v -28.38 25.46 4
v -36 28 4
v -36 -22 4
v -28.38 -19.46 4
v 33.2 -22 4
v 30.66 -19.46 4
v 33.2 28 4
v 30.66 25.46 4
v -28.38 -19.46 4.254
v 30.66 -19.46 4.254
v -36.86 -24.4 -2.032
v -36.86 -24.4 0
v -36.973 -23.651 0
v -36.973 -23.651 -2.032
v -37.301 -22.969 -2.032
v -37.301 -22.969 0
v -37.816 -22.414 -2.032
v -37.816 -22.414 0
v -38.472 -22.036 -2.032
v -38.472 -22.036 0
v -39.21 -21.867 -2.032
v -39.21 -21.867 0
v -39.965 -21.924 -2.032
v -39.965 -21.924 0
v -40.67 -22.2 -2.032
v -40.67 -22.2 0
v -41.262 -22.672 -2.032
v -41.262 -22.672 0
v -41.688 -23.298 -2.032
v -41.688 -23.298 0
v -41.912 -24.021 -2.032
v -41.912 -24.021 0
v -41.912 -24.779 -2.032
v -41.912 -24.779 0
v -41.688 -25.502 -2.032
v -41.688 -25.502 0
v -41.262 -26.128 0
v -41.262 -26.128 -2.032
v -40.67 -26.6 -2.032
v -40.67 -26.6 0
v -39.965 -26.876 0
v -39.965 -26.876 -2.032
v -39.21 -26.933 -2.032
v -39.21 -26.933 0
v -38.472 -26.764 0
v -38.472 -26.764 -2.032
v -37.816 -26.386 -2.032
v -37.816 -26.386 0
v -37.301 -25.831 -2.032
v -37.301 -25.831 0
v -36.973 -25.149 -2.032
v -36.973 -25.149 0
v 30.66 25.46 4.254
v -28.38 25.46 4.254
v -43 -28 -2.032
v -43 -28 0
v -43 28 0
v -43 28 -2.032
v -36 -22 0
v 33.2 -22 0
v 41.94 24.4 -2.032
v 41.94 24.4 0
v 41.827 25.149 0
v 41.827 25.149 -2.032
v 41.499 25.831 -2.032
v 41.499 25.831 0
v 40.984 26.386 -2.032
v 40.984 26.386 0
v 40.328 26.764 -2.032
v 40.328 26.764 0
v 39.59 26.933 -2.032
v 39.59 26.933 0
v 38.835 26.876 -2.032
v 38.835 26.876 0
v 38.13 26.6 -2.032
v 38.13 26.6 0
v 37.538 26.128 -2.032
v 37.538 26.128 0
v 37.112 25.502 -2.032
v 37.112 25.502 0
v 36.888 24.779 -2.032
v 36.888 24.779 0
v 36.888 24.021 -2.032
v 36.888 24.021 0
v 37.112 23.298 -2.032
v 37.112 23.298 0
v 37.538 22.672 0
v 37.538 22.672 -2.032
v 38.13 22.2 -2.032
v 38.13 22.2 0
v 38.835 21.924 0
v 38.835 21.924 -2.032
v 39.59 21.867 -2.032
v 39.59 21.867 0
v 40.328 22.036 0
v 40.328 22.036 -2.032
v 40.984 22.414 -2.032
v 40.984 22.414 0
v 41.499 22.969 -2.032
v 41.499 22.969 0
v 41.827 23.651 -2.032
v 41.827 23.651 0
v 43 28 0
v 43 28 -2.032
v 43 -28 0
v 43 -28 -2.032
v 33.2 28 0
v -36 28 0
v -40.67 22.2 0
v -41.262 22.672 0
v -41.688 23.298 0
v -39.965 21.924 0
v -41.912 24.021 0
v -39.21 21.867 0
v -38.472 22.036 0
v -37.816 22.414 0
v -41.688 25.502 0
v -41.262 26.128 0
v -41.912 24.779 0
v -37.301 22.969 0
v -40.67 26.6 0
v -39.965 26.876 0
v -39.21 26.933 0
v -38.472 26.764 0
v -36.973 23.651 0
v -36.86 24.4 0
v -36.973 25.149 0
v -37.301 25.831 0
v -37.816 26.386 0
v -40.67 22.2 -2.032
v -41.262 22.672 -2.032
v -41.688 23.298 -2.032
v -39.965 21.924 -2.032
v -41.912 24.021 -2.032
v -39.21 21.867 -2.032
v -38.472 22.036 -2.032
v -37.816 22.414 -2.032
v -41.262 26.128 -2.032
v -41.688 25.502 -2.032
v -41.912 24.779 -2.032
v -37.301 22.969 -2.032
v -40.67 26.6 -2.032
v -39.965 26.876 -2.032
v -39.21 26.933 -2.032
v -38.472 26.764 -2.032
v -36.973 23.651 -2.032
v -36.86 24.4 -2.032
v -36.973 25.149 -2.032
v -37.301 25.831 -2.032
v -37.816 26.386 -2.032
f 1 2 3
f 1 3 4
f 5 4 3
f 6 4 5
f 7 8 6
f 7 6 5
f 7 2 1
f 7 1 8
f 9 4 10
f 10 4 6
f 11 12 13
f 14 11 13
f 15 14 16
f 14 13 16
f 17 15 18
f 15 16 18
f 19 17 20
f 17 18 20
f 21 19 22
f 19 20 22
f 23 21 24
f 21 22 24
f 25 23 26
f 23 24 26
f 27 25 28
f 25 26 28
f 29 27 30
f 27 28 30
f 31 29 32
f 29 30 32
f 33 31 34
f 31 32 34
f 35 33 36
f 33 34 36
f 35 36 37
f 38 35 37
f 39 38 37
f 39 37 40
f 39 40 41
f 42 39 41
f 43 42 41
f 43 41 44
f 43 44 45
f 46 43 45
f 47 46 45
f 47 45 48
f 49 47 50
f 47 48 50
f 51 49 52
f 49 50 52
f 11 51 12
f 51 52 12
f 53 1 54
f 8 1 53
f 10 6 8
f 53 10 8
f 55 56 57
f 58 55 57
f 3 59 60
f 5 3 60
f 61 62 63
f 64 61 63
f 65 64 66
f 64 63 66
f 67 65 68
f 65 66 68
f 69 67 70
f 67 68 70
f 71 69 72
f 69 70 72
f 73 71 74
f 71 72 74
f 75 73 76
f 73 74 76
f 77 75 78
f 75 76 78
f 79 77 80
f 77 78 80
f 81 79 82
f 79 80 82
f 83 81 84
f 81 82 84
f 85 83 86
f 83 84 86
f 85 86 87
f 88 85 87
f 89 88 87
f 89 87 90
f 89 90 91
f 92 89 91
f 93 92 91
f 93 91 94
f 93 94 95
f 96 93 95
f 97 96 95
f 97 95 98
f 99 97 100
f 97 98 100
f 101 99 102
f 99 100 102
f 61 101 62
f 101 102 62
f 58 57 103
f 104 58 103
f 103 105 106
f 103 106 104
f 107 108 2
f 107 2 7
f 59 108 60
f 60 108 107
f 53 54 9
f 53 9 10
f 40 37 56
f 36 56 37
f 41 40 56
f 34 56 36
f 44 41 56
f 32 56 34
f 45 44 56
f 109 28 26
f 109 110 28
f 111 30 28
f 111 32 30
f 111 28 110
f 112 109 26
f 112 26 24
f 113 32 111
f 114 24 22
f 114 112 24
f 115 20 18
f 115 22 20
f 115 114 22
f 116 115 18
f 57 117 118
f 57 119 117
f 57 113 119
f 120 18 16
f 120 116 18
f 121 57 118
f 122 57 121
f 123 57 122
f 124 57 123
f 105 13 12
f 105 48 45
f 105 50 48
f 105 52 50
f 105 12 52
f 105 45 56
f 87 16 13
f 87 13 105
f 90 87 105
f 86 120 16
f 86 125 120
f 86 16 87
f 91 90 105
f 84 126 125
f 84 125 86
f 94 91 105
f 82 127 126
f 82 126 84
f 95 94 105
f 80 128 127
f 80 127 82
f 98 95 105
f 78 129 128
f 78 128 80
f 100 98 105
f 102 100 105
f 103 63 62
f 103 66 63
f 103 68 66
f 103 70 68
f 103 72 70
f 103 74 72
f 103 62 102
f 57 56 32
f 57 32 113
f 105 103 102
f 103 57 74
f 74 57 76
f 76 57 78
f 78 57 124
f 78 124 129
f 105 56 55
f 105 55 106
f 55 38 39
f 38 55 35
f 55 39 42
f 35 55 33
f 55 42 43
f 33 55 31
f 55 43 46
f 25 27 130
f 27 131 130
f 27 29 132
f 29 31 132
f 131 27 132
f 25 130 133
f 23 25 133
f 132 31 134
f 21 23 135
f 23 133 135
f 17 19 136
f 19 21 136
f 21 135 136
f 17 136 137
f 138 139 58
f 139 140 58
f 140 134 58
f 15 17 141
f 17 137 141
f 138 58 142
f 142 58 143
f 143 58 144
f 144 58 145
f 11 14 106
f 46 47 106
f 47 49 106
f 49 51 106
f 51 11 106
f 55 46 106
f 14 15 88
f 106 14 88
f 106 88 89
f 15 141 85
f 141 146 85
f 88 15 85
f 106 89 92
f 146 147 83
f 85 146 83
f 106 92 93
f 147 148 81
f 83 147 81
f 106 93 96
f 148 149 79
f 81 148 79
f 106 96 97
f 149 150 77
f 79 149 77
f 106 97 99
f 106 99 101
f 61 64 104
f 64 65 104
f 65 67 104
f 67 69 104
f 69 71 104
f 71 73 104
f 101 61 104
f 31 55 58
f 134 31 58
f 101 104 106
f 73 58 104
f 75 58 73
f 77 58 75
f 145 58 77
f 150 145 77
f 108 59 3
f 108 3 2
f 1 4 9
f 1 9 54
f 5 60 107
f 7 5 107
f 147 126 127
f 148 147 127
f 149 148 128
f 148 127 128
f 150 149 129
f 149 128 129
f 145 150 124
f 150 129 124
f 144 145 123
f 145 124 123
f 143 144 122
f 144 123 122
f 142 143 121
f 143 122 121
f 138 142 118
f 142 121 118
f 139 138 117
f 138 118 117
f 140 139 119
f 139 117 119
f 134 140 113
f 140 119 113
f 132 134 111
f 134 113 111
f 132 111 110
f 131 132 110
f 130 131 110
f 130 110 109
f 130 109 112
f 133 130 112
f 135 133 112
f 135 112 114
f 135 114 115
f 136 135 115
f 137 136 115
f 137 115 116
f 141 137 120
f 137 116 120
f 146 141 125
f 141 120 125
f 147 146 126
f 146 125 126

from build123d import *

# Parameters (mm, degrees)
F0_W     = 86
F0_H     = 56
F0_R     = 2.54
F1_DEPTH = 2.032
F2_W     = 69.2
F2_H     = 50
F3_DEPTH = 4
F5_W     = 59.04
F5_H     = 44.92
F6_DEPTH = 0.254


# Not quite as in the source:
# - a feature of the source that left no trace in its solid (it failed there, or was rolled back) is left out


with BuildPart() as f1:
    # F0 (on Top) → F1 (new body)
    with BuildSketch(Plane.XY):
        Rectangle(F0_W, F0_H)
        with Locations((-39.4, -24.4)):
            Circle(F0_R, mode=Mode.SUBTRACT)
        with Locations((-39.4, 24.4)):
            Circle(F0_R, mode=Mode.SUBTRACT)
        with Locations((39.4, 24.4)):
            Circle(F0_R, mode=Mode.SUBTRACT)
    extrude(amount=-F1_DEPTH)


with BuildPart() as f3:
    # F2 (on Top) → F3 (new body)
    with BuildSketch(Plane.XY):
        with Locations((-1.4, 3)):
            Rectangle(F2_W, F2_H)
    extrude(amount=F3_DEPTH)

    # F5 (on face) → F6 (join)
    with BuildSketch(Plane.XY.offset(4)):
        with Locations((1.14, 3)):
            Rectangle(F5_W, F5_H)
    extrude(amount=F6_DEPTH)


solid = Compound([f1.part, f3.part])
